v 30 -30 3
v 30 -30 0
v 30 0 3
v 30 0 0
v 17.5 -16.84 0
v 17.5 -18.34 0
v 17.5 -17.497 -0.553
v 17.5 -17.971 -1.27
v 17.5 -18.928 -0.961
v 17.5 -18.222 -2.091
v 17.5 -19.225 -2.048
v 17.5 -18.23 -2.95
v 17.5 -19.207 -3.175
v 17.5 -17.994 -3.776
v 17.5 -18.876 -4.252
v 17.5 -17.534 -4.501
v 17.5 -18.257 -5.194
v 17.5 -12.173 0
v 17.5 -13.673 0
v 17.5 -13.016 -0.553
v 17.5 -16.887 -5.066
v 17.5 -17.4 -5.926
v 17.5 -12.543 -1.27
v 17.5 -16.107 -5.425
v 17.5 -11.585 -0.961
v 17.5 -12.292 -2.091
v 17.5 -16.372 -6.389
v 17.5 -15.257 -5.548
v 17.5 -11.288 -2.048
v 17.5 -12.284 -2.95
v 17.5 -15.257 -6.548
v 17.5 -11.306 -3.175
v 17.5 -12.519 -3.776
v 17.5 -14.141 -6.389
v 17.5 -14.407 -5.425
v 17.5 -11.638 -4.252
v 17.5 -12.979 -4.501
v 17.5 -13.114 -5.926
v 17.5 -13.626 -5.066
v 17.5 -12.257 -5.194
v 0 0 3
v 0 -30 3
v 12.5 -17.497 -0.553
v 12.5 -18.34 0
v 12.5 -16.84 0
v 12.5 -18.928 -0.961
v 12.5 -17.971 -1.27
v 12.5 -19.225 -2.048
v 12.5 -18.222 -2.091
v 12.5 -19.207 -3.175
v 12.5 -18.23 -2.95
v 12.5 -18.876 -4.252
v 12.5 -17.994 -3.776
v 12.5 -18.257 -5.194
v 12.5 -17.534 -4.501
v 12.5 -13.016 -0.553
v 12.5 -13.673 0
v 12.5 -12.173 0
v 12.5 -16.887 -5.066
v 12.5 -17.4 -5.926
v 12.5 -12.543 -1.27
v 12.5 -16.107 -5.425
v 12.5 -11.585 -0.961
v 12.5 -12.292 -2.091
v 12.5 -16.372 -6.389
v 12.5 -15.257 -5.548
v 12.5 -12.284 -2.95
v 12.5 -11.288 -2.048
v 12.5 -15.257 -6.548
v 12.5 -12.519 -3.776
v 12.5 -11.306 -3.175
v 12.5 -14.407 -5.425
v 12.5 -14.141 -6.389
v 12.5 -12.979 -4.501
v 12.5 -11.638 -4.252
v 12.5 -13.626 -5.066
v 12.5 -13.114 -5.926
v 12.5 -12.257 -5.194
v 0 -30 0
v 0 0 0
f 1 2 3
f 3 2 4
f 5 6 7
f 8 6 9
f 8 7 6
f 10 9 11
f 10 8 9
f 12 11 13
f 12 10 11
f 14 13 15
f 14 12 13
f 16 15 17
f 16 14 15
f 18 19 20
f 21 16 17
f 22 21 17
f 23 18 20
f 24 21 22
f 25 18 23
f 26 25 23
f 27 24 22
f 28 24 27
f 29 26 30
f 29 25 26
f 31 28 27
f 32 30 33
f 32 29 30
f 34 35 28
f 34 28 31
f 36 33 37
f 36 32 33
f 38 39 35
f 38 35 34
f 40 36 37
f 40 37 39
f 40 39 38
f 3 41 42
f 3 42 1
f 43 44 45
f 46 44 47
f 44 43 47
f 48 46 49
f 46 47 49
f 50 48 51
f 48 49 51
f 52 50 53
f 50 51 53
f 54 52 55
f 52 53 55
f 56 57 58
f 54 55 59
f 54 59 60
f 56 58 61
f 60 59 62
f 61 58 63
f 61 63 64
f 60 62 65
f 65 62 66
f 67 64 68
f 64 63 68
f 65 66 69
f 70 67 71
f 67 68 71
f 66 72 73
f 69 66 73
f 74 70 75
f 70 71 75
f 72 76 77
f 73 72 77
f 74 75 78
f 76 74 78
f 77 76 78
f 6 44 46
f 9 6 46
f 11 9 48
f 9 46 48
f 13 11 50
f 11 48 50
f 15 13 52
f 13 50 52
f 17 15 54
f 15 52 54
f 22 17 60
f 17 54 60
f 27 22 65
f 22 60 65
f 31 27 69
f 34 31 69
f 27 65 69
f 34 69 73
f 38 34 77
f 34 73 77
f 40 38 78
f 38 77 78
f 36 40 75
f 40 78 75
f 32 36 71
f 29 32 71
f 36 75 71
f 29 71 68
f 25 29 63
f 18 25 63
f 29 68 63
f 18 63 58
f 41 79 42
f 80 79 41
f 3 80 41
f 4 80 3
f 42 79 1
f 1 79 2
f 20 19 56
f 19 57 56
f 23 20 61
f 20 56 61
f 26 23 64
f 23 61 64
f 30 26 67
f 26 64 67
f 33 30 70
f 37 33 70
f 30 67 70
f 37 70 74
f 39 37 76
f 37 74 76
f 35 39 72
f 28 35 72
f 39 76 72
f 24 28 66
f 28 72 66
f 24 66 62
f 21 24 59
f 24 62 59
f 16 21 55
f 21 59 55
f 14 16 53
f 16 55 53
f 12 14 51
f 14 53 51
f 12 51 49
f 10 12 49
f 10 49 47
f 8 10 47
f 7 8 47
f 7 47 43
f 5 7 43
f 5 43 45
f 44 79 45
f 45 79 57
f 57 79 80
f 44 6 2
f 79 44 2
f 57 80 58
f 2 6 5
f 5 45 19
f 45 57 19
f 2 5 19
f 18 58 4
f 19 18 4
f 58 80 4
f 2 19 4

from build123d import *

# Parameters (mm, degrees)
ESQUISSE1_W        = 30
ESQUISSE1_H        = 30
BOSS_EXTRU_1_DEPTH = 3
BOSS_EXTRU_2_DEPTH = 2.5


with BuildPart() as part:
    # Esquisse1 → Boss.-Extru.1 (new body)
    with BuildSketch(Plane.XY):
        with Locations((15, -15)):
            Rectangle(ESQUISSE1_W, ESQUISSE1_H)
    extrude(amount=BOSS_EXTRU_1_DEPTH)

    # Esquisse4 → Boss.-Extru.2 (add, symmetric)
    with BuildSketch(Plane.ZY.offset(-15)):
        with BuildLine():
            Line((0, -12.173324278), (0, -13.673324278))
            ThreePointArc((0, -13.673324278), (-5.548147475, -15.256657612), (0, -16.839990945))
            Line((0, -16.839990945), (0, -18.339990945))
            ThreePointArc((0, -18.339990945), (-6.548147475, -15.256657612), (0, -12.173324278))
        make_face()
    extrude(amount=BOSS_EXTRU_2_DEPTH, both=True)


solid = part.part
